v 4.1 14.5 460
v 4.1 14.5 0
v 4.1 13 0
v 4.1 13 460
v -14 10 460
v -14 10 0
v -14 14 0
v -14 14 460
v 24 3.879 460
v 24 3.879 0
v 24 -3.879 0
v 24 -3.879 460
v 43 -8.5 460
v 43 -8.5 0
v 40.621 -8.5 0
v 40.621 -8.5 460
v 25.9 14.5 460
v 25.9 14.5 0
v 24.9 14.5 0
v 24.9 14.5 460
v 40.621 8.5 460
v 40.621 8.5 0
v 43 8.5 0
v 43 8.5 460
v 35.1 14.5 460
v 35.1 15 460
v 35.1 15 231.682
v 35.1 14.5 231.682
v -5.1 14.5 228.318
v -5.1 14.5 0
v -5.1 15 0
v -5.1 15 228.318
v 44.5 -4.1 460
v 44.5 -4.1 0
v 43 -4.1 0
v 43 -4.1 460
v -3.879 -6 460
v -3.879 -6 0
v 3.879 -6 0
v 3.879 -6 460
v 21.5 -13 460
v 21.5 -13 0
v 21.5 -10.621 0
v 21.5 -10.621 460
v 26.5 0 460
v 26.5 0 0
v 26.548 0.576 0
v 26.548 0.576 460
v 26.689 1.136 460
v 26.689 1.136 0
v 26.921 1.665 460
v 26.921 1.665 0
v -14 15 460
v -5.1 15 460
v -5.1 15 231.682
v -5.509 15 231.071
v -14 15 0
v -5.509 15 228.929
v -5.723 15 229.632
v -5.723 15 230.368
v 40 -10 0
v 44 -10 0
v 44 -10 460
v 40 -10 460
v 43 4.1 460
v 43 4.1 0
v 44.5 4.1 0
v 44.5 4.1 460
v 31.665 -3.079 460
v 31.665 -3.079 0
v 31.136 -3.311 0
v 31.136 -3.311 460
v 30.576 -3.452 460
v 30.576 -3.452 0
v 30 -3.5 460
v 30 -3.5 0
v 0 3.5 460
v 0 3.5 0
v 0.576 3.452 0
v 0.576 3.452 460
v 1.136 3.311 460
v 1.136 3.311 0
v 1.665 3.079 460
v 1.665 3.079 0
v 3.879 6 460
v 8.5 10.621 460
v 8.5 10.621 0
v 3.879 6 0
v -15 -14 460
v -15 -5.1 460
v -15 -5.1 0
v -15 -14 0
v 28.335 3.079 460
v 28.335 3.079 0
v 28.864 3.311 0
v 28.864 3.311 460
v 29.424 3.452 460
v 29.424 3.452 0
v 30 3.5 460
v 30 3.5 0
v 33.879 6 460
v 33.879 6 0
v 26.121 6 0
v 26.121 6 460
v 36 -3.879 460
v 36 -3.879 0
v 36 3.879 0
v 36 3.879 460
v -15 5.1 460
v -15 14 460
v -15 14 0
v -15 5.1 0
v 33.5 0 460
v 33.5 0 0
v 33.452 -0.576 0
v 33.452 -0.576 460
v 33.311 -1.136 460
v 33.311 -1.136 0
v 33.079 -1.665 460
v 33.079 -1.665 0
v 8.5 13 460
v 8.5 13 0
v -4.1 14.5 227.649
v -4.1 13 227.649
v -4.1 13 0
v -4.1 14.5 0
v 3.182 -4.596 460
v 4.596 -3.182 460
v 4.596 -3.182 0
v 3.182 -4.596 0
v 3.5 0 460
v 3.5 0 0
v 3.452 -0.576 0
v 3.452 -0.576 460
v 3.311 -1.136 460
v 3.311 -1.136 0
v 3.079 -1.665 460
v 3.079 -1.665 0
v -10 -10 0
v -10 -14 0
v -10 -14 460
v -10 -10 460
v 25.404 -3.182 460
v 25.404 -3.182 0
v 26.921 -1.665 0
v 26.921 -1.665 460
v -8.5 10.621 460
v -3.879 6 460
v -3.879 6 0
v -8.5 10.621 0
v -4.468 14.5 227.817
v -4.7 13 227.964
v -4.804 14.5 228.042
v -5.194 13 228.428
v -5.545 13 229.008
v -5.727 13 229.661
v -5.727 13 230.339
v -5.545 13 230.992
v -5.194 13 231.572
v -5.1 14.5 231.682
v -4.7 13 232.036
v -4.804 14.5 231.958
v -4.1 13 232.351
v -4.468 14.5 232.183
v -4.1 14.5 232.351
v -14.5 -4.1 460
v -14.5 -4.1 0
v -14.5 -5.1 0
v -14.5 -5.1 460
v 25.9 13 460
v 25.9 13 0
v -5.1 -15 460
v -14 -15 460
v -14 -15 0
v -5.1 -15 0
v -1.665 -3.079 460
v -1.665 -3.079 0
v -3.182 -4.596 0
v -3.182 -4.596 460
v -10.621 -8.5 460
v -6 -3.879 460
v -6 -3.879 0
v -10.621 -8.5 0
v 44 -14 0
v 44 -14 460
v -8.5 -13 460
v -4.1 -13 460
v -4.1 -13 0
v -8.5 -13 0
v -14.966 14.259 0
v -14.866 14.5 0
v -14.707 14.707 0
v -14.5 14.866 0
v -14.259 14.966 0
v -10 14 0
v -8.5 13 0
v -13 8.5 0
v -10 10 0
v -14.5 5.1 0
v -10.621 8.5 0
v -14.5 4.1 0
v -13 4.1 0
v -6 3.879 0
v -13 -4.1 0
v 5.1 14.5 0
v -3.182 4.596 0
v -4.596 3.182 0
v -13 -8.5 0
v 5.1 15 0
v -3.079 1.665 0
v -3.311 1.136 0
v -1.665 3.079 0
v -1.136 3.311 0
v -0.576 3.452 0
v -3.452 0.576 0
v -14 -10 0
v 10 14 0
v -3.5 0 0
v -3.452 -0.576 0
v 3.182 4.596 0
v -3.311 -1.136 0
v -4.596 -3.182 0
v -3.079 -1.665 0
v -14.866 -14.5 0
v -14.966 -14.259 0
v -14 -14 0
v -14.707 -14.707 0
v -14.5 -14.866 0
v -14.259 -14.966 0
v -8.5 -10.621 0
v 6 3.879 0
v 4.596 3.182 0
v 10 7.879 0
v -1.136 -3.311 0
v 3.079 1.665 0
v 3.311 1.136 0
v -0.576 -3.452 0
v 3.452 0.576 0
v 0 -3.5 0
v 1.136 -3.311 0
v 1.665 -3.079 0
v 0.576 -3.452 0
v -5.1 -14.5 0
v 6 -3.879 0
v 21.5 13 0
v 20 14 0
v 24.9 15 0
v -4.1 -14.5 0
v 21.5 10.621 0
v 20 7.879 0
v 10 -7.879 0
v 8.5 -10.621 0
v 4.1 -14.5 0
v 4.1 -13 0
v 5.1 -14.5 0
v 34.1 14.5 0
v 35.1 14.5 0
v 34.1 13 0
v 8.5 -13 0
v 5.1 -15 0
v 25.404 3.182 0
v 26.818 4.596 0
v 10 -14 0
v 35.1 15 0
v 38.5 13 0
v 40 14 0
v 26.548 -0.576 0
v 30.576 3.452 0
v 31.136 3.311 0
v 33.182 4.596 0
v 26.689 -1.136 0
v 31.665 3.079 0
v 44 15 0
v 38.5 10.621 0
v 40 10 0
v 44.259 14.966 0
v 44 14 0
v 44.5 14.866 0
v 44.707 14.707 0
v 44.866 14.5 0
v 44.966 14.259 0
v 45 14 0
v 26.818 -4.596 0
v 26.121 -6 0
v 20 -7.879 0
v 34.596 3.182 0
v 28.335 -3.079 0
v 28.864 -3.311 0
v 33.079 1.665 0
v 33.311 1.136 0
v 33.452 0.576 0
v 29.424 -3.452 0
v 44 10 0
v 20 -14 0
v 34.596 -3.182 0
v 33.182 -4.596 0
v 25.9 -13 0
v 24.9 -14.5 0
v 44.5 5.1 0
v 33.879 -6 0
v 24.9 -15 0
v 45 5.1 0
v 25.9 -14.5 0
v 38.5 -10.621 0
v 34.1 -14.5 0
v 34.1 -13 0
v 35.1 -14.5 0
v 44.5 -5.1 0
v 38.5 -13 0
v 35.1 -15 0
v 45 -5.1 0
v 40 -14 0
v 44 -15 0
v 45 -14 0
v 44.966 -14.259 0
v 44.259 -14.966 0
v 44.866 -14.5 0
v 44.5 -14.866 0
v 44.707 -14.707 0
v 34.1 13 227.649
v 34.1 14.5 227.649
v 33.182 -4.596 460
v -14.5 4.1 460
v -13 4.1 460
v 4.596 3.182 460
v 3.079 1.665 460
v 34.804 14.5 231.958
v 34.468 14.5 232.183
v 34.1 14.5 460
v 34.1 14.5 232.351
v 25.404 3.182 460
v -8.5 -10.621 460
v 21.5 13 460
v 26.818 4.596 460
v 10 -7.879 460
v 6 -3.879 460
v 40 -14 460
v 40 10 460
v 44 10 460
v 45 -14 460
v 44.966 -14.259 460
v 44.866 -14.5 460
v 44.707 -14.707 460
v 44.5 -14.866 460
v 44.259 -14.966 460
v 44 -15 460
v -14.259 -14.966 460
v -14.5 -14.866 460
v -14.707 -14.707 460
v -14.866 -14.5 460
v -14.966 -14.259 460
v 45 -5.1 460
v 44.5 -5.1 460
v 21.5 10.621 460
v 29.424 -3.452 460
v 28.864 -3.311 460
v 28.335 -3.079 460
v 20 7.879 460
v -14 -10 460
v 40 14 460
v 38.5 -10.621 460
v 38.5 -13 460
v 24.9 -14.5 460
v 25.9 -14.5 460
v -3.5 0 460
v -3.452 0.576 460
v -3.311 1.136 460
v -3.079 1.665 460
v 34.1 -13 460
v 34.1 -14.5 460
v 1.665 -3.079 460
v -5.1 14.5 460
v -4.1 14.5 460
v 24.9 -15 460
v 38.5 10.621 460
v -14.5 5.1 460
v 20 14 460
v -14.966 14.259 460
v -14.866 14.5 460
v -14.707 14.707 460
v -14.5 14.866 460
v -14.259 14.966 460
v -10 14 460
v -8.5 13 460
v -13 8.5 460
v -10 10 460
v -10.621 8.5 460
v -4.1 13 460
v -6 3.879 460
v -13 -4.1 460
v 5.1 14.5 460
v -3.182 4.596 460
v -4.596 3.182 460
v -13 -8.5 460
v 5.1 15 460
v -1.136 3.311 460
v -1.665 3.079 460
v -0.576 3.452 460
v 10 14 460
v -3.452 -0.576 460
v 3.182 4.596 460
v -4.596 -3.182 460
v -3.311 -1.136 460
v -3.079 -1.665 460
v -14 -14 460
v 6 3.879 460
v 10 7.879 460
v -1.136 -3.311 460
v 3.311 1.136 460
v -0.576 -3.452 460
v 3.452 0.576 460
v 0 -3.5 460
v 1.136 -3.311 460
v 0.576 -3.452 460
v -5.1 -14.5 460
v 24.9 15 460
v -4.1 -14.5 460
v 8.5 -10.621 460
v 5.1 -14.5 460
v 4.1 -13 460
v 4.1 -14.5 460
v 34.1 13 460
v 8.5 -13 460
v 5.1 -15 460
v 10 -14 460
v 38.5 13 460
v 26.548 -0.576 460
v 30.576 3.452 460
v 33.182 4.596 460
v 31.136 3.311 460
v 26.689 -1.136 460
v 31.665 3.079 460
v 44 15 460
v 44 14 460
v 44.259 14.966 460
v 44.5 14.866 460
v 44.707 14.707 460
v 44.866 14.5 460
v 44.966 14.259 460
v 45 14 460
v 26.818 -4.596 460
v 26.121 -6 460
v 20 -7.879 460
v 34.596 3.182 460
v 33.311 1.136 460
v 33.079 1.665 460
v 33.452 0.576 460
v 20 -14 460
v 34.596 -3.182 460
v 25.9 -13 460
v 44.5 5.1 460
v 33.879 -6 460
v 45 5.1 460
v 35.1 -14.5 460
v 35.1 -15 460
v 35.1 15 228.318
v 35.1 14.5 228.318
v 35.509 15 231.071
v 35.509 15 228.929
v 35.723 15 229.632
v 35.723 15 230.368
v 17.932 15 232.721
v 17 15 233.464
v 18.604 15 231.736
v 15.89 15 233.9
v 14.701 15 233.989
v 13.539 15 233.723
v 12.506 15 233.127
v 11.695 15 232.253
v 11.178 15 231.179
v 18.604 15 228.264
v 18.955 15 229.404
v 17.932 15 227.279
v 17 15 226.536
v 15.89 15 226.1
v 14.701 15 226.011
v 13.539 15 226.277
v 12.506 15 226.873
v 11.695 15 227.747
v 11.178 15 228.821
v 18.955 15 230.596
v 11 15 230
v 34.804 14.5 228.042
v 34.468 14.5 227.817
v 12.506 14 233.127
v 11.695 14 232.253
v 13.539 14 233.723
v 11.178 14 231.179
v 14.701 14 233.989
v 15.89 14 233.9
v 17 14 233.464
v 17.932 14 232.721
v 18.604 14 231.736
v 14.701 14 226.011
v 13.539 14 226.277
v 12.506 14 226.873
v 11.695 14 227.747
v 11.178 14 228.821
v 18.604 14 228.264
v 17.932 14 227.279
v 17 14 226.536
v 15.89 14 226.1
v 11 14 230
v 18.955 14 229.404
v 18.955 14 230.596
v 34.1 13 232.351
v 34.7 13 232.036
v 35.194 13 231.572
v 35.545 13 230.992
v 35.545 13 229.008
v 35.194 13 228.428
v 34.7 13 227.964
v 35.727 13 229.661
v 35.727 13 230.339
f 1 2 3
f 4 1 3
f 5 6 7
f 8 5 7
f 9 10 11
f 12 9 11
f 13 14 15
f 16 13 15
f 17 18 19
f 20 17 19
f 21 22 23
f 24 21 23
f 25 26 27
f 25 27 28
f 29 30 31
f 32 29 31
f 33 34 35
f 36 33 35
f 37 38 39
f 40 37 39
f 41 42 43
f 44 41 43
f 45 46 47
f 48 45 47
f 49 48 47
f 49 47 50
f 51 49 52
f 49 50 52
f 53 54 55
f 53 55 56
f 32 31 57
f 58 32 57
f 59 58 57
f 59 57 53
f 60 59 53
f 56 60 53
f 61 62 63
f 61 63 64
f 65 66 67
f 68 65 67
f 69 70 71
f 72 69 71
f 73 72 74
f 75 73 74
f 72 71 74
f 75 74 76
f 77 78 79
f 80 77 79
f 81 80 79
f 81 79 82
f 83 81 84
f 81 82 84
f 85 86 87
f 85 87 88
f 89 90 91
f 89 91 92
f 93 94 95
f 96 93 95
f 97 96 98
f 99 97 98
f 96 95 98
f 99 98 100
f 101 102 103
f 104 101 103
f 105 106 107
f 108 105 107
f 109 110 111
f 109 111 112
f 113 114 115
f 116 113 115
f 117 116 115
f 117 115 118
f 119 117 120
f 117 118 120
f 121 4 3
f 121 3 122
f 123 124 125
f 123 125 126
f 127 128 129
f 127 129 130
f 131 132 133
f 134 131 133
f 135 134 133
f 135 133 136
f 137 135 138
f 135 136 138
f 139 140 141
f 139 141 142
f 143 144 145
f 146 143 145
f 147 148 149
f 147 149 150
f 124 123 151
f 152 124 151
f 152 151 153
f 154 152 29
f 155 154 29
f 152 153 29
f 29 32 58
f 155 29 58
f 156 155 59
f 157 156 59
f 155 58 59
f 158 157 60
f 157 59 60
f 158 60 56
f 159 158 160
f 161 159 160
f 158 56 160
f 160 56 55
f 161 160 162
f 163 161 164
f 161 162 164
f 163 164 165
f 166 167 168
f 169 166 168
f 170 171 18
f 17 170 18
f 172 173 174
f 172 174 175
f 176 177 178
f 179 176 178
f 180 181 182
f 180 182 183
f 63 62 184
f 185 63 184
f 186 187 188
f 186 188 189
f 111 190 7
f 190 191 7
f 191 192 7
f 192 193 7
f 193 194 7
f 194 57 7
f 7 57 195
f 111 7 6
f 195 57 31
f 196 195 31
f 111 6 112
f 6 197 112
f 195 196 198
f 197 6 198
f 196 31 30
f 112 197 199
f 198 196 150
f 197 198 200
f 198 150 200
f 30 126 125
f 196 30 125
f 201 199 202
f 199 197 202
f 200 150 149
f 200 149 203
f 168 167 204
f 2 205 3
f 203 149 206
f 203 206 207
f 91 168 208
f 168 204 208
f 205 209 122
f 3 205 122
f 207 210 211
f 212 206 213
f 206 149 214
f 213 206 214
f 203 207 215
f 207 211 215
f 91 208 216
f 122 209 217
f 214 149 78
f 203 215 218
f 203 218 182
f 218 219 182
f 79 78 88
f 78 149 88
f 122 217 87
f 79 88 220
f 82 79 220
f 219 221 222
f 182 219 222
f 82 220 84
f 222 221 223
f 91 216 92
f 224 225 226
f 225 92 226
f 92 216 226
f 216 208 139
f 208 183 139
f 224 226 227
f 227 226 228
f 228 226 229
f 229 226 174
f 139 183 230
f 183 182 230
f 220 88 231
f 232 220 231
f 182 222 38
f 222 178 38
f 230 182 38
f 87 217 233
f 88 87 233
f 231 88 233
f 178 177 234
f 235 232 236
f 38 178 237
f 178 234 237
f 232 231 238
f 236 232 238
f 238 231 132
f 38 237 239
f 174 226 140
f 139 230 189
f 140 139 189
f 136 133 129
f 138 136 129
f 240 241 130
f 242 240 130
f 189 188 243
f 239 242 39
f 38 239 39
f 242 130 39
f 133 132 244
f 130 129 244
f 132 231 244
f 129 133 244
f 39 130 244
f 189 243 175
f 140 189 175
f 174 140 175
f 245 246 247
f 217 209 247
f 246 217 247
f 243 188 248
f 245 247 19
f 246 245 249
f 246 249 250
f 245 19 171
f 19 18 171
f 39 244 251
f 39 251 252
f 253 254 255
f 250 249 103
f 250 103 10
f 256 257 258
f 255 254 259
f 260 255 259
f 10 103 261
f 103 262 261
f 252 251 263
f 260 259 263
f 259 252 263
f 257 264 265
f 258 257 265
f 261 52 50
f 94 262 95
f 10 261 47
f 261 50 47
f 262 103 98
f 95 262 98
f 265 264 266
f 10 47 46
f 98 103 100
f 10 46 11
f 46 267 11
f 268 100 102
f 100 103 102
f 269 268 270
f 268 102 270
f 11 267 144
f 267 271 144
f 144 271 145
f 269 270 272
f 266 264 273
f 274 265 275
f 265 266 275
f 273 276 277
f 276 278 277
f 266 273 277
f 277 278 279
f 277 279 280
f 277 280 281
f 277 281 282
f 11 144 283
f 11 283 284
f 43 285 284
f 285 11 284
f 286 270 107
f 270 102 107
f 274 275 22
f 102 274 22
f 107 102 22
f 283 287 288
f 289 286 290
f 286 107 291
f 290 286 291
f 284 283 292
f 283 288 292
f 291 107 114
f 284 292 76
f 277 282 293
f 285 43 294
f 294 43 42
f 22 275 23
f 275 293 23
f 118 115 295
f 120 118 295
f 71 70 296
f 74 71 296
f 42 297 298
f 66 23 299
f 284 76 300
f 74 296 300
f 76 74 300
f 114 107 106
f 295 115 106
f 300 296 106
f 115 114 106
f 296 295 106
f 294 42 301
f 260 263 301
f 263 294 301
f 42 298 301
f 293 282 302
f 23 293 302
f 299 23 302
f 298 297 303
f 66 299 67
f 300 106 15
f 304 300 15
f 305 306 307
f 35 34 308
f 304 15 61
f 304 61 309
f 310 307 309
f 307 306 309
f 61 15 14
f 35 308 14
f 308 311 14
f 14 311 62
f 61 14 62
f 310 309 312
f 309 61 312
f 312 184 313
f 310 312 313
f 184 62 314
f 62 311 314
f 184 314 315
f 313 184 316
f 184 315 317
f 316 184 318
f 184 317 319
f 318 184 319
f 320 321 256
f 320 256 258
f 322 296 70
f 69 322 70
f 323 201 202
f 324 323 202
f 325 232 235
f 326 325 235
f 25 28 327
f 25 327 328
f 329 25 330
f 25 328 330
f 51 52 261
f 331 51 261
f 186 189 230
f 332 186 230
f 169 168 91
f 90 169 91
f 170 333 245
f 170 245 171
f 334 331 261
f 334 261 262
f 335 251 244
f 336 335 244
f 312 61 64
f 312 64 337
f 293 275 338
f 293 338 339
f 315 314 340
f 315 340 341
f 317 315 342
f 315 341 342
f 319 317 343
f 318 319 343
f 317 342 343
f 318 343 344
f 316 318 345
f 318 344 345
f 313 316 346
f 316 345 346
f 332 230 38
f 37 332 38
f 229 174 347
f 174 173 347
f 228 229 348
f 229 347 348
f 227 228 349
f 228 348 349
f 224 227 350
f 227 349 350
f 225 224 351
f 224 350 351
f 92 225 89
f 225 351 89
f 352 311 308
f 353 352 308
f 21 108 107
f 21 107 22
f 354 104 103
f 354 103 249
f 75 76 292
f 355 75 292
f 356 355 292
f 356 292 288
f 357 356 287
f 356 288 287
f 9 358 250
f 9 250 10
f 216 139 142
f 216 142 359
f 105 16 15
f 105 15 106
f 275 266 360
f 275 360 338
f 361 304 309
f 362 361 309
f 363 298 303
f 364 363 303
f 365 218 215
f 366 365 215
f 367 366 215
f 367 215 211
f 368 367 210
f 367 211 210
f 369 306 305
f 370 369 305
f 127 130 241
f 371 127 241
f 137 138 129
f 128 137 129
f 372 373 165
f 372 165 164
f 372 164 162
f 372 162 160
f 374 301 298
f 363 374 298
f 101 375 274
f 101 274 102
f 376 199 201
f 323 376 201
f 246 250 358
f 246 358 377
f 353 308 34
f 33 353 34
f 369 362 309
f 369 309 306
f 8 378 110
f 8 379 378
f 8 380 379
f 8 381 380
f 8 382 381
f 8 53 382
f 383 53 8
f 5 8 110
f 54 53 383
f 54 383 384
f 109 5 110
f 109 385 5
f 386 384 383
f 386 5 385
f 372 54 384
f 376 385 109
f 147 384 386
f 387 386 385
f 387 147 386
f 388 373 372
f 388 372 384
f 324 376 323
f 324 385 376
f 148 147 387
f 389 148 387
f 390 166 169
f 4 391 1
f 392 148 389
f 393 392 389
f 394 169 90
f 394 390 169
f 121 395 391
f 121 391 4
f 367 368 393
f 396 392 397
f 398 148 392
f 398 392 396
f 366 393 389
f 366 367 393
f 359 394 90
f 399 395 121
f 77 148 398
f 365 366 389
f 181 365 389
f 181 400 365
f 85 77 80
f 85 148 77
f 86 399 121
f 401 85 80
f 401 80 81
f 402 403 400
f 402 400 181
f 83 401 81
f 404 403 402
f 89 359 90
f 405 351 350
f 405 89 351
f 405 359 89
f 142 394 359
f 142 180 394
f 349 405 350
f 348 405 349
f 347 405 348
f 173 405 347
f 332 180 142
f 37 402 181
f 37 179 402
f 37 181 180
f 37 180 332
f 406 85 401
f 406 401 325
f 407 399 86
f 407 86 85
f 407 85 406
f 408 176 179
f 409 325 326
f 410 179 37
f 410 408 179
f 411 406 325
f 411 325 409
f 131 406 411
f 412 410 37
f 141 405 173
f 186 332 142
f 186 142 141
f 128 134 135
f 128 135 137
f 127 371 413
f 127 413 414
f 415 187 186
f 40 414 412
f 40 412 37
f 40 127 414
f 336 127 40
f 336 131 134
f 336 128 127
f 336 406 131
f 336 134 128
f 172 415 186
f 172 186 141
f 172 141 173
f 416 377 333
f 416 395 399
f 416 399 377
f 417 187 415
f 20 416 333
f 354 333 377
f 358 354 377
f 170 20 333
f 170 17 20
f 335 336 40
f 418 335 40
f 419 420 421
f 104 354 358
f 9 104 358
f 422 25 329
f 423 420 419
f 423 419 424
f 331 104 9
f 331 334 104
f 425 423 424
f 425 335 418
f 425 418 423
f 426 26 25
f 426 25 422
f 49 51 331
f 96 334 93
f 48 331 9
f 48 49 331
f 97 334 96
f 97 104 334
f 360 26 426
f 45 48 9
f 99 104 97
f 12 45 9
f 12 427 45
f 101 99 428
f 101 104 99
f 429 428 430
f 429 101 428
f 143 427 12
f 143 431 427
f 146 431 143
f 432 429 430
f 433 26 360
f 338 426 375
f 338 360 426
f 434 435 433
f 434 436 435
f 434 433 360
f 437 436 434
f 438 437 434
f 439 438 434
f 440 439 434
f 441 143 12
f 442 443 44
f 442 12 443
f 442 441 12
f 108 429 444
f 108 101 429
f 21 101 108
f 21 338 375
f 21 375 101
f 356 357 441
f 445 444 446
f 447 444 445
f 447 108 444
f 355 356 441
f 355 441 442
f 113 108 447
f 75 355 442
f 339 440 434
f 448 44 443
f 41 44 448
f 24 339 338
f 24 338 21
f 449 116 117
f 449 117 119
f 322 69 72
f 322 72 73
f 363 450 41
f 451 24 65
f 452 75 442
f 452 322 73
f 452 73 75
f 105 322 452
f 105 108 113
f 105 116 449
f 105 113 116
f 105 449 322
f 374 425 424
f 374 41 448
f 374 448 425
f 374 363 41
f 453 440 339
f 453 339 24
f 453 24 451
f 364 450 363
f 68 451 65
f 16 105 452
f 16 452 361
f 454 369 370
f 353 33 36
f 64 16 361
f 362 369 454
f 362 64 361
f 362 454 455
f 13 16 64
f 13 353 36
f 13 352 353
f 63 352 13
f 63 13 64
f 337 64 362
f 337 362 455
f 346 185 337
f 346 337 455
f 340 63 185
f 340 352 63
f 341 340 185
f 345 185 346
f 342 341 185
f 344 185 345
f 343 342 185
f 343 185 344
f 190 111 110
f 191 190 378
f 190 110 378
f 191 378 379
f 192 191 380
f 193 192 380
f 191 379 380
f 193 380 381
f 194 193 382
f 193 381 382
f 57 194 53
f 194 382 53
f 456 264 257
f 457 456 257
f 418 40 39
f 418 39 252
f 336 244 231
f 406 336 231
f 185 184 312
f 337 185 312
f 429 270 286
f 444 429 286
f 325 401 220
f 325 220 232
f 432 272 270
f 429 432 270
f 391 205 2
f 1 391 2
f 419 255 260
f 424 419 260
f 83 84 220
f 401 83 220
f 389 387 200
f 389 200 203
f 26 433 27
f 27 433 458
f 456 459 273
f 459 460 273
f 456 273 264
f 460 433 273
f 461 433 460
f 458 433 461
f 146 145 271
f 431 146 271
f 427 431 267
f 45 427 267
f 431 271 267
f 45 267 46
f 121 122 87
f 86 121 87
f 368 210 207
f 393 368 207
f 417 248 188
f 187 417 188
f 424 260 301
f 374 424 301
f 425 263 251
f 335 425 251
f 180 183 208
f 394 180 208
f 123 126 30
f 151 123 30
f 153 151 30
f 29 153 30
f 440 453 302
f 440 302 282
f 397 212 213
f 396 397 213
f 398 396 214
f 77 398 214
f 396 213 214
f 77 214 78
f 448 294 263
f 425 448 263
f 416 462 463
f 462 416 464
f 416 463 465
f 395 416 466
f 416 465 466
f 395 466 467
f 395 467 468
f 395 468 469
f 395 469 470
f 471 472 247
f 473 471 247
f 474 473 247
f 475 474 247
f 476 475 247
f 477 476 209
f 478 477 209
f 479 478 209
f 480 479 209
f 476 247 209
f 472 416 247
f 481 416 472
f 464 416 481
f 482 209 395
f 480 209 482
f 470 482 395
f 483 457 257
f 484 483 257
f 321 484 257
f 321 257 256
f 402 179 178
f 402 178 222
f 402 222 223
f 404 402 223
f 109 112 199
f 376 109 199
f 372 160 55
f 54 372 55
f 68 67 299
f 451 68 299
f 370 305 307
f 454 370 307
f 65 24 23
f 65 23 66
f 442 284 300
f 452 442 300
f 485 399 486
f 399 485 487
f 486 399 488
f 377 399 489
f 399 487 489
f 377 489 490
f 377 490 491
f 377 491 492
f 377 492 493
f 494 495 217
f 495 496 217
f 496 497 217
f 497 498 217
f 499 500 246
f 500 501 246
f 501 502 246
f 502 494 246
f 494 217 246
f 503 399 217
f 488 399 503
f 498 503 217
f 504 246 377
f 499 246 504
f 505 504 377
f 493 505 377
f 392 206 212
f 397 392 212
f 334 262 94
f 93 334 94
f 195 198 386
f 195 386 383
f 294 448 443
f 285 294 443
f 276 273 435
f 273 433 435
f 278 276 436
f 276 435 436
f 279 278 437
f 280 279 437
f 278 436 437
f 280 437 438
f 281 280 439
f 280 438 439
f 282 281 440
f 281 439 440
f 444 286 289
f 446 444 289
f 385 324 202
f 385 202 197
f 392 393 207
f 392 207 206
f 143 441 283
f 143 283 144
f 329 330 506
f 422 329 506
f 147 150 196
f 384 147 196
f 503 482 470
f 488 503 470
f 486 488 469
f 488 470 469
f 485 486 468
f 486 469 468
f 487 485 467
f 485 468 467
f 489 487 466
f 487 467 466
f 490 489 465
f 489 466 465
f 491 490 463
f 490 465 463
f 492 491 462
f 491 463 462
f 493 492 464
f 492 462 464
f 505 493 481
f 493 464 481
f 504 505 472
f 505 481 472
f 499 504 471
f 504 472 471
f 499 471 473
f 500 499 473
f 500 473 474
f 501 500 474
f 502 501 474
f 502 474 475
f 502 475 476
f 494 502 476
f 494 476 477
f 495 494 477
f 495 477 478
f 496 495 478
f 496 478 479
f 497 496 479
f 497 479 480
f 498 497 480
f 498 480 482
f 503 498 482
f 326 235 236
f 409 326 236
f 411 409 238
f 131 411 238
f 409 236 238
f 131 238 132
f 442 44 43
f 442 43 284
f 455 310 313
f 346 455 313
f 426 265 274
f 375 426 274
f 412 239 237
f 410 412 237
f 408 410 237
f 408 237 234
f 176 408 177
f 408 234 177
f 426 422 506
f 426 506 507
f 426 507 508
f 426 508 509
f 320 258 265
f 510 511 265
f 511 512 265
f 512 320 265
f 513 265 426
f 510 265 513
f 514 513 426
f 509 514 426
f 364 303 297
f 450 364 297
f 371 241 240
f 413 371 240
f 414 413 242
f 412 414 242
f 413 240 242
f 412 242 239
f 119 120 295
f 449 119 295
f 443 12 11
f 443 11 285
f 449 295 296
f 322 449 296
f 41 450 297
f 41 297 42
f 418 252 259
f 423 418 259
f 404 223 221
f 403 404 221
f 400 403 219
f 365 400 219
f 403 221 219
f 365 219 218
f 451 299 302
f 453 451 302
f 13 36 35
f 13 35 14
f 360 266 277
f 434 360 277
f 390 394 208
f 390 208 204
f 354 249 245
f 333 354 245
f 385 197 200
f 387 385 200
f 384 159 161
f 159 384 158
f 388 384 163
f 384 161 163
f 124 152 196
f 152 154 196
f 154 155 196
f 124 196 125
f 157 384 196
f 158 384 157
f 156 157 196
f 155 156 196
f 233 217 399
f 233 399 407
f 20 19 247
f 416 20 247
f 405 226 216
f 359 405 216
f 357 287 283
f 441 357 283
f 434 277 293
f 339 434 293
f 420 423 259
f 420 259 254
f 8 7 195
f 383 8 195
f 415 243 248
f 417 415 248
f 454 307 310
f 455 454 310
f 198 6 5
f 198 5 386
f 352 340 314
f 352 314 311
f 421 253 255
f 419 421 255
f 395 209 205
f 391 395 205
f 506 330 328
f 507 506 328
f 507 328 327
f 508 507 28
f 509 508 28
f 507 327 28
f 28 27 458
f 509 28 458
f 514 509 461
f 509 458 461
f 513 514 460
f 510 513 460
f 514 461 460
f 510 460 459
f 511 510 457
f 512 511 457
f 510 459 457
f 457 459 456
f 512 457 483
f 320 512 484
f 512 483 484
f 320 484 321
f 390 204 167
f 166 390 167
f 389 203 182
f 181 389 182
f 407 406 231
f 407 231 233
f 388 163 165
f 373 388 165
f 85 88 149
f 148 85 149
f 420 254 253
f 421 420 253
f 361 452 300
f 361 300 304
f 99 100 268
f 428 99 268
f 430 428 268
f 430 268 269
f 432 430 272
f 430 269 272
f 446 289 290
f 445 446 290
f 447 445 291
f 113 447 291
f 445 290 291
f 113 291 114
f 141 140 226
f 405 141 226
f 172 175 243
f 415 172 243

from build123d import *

# Parameters (mm, degrees)
ESBO_O1_W                      = 4
ESBO_O1_H                      = 4
RESSALTO_EXTRUS_O1_DEPTH       = 460
PADR_OCIRCULAR1_COUNT          = 4
PADR_O_LINEAR1_COUNT           = 2
PADR_O_LINEAR1_PITCH           = 30
PADR_O_LINEAR1_COPY_1_SKETCH_W = 4
PADR_O_LINEAR1_COPY_1_SKETCH_H = 4
PADR_O_LINEAR1_COPY_1_DEPTH    = 460
PADR_O_LINEAR1_COPY_2_SKETCH_W = 4
PADR_O_LINEAR1_COPY_2_SKETCH_H = 4
PADR_O_LINEAR1_COPY_2_DEPTH    = 460
PADR_O_LINEAR1_COPY_3_SKETCH_W = 4
PADR_O_LINEAR1_COPY_3_SKETCH_H = 4
PADR_O_LINEAR1_COPY_3_DEPTH    = 460
ESBO_O4_W                      = 10
ESBO_O4_H                      = 28
CORTE_EXTRUS_O1_DEPTH          = 463.439185191
FILETE1_R                      = 1
ESBO_O5_R                      = 4
CORTE_EXTRUS_O2_DEPTH          = 10
SKETCH2_R                      = 2.5
CUT_EXTRUDE1_DEPTH             = 3


with BuildPart() as part:
    # Esboço1 → Ressalto-extrusão1 (new body)
    with BuildSketch(Plane.XY):
        with BuildLine():
            ThreePointArc((-1.664601464, 3.078815026), (-0.858529967, 3.393070335), (0, 3.5))
            Line((0, 3.5), (0, 6))
            Line((0, 6), (-3.878679656, 6))
            Line((-3.878679656, 6), (-8.5, 10.621320344))
            Line((-8.5, 10.621320344), (-8.5, 13))
            Line((-8.5, 13), (-4.1, 13))
            Line((-4.1, 13), (-4.1, 14.5))
            Line((-4.1, 14.5), (-5.1, 14.5))
            Line((-5.1, 14.5), (-5.1, 15))
            Line((-5.1, 15), (-15, 15))
            Line((-15, 15), (-15, 5.1))
            Line((-15, 5.1), (-14.5, 5.1))
            Line((-14.5, 5.1), (-14.5, 4.1))
            Line((-14.5, 4.1), (-13, 4.1))
            Line((-13, 4.1), (-13, 8.5))
            Line((-13, 8.5), (-10.621320344, 8.5))
            Line((-10.621320344, 8.5), (-6, 3.878679656))
            Line((-6, 3.878679656), (-6, 0))
            Line((-6, 0), (-3.5, 0))
            ThreePointArc((-3.5, 0), (-3.393070335, 0.858529967), (-3.078815026, 1.664601464))
            Line((-3.078815026, 1.664601464), (-4.596194078, 3.181980515))
            Line((-4.596194078, 3.181980515), (-3.181980515, 4.596194078))
            Line((-3.181980515, 4.596194078), (-1.664601464, 3.078815026))
        make_face()
        with Locations((-12, 12)):
            Rectangle(ESBO_O1_W, ESBO_O1_H, mode=Mode.SUBTRACT)
    ressalto_extrus_o1 = extrude(amount=RESSALTO_EXTRUS_O1_DEPTH)

    # PadrãoCircular1: Ressalto-extrusão1 ×4 about axis
    padr_ocircular1_axis = Axis((0, 0, 0), (0, 0, 1))
    for i in range(1, PADR_OCIRCULAR1_COUNT):
        add(ressalto_extrus_o1.rotate(padr_ocircular1_axis, i * 360 / PADR_OCIRCULAR1_COUNT))

    # Padrão linear1: Ressalto-extrusão1 ×2
    with Locations(*[(i * PADR_O_LINEAR1_PITCH, 0, 0) for i in range(1, PADR_O_LINEAR1_COUNT)]):
        add(ressalto_extrus_o1)

    # Padrão linear1 copy 1 sketch → Padrão linear1 copy 1 (add)
    with BuildSketch(Plane(origin=(30, 0, 0), x_dir=(0, 1, 0), z_dir=(0, 0, 1))):
        with BuildLine():
            ThreePointArc((-1.664601464, 3.078815026), (-0.858529967, 3.393070335), (0, 3.5))
            Line((0, 3.5), (0, 6))
            Line((0, 6), (-3.878679656, 6))
            Line((-3.878679656, 6), (-8.5, 10.621320344))
            Line((-8.5, 10.621320344), (-8.5, 13))
            Line((-8.5, 13), (-4.1, 13))
            Line((-4.1, 13), (-4.1, 14.5))
            Line((-4.1, 14.5), (-5.1, 14.5))
            Line((-5.1, 14.5), (-5.1, 15))
            Line((-5.1, 15), (-15, 15))
            Line((-15, 15), (-15, 5.1))
            Line((-15, 5.1), (-14.5, 5.1))
            Line((-14.5, 5.1), (-14.5, 4.1))
            Line((-14.5, 4.1), (-13, 4.1))
            Line((-13, 4.1), (-13, 8.5))
            Line((-13, 8.5), (-10.621320344, 8.5))
            Line((-10.621320344, 8.5), (-6, 3.878679656))
            Line((-6, 3.878679656), (-6, 0))
            Line((-6, 0), (-3.5, 0))
            ThreePointArc((-3.5, 0), (-3.393070335, 0.858529967), (-3.078815026, 1.664601464))
            Line((-3.078815026, 1.664601464), (-4.596194078, 3.181980515))
            Line((-4.596194078, 3.181980515), (-3.181980515, 4.596194078))
            Line((-3.181980515, 4.596194078), (-1.664601464, 3.078815026))
        make_face()
        with Locations((-12, 12)):
            Rectangle(PADR_O_LINEAR1_COPY_1_SKETCH_W, PADR_O_LINEAR1_COPY_1_SKETCH_H, mode=Mode.SUBTRACT)
    extrude(amount=PADR_O_LINEAR1_COPY_1_DEPTH)

    # Padrão linear1 copy 2 sketch → Padrão linear1 copy 2 (add)
    with BuildSketch(Plane(origin=(30, 0, 0), x_dir=(-1, 0, 0), z_dir=(0, 0, 1))):
        with BuildLine():
            ThreePointArc((-1.664601464, 3.078815026), (-0.858529967, 3.393070335), (0, 3.5))
            Line((0, 3.5), (0, 6))
            Line((0, 6), (-3.878679656, 6))
            Line((-3.878679656, 6), (-8.5, 10.621320344))
            Line((-8.5, 10.621320344), (-8.5, 13))
            Line((-8.5, 13), (-4.1, 13))
            Line((-4.1, 13), (-4.1, 14.5))
            Line((-4.1, 14.5), (-5.1, 14.5))
            Line((-5.1, 14.5), (-5.1, 15))
            Line((-5.1, 15), (-15, 15))
            Line((-15, 15), (-15, 5.1))
            Line((-15, 5.1), (-14.5, 5.1))
            Line((-14.5, 5.1), (-14.5, 4.1))
            Line((-14.5, 4.1), (-13, 4.1))
            Line((-13, 4.1), (-13, 8.5))
            Line((-13, 8.5), (-10.621320344, 8.5))
            Line((-10.621320344, 8.5), (-6, 3.878679656))
            Line((-6, 3.878679656), (-6, 0))
            Line((-6, 0), (-3.5, 0))
            ThreePointArc((-3.5, 0), (-3.393070335, 0.858529967), (-3.078815026, 1.664601464))
            Line((-3.078815026, 1.664601464), (-4.596194078, 3.181980515))
            Line((-4.596194078, 3.181980515), (-3.181980515, 4.596194078))
            Line((-3.181980515, 4.596194078), (-1.664601464, 3.078815026))
        make_face()
        with Locations((-12, 12)):
            Rectangle(PADR_O_LINEAR1_COPY_2_SKETCH_W, PADR_O_LINEAR1_COPY_2_SKETCH_H, mode=Mode.SUBTRACT)
    extrude(amount=PADR_O_LINEAR1_COPY_2_DEPTH)

    # Padrão linear1 copy 3 sketch → Padrão linear1 copy 3 (add)
    with BuildSketch(Plane(origin=(30, 0, 0), x_dir=(0, -1, 0), z_dir=(0, 0, 1))):
        with BuildLine():
            ThreePointArc((-1.664601464, 3.078815026), (-0.858529967, 3.393070335), (0, 3.5))
            Line((0, 3.5), (0, 6))
            Line((0, 6), (-3.878679656, 6))
            Line((-3.878679656, 6), (-8.5, 10.621320344))
            Line((-8.5, 10.621320344), (-8.5, 13))
            Line((-8.5, 13), (-4.1, 13))
            Line((-4.1, 13), (-4.1, 14.5))
            Line((-4.1, 14.5), (-5.1, 14.5))
            Line((-5.1, 14.5), (-5.1, 15))
            Line((-5.1, 15), (-15, 15))
            Line((-15, 15), (-15, 5.1))
            Line((-15, 5.1), (-14.5, 5.1))
            Line((-14.5, 5.1), (-14.5, 4.1))
            Line((-14.5, 4.1), (-13, 4.1))
            Line((-13, 4.1), (-13, 8.5))
            Line((-13, 8.5), (-10.621320344, 8.5))
            Line((-10.621320344, 8.5), (-6, 3.878679656))
            Line((-6, 3.878679656), (-6, 0))
            Line((-6, 0), (-3.5, 0))
            ThreePointArc((-3.5, 0), (-3.393070335, 0.858529967), (-3.078815026, 1.664601464))
            Line((-3.078815026, 1.664601464), (-4.596194078, 3.181980515))
            Line((-4.596194078, 3.181980515), (-3.181980515, 4.596194078))
            Line((-3.181980515, 4.596194078), (-1.664601464, 3.078815026))
        make_face()
        with Locations((-12, 12)):
            Rectangle(PADR_O_LINEAR1_COPY_3_SKETCH_W, PADR_O_LINEAR1_COPY_3_SKETCH_H, mode=Mode.SUBTRACT)
    extrude(amount=PADR_O_LINEAR1_COPY_3_DEPTH)

    # Esboço4 → Corte-extrusão1 (cut, through all)
    with BuildSketch(Plane(origin=(0, 0, 0), x_dir=(-1, 0, 0), z_dir=(0, 0, -1))):
        with Locations((-15, 0)):
            Rectangle(ESBO_O4_W, ESBO_O4_H)
    extrude(amount=-CORTE_EXTRUS_O1_DEPTH, mode=Mode.SUBTRACT)

    # Filete1
    filete1_edges = [part.edges().sort_by_distance(p)[0] for p in [
        (45, -15, 230),
        (45, 15, 230),
        (-15, 15, 230),
        (-15, -15, 230),
    ]]
    fillet(filete1_edges, radius=FILETE1_R)

    # Esboço5 → Corte-extrusão2 (cut)
    with BuildSketch(Plane(origin=(0, 15, 0), x_dir=(1, 0, 0), z_dir=(0, 1, 0))):
        with Locations(Location((15, -230, 0), (0, 0, 180))):
            Circle(ESBO_O5_R)
    extrude(amount=-CORTE_EXTRUS_O2_DEPTH, mode=Mode.SUBTRACT)

    # Sketch2 → Cut-Extrude1 (cut)
    with BuildSketch(Plane(origin=(0, 15, 0), x_dir=(1, 0, 0), z_dir=(0, 1, 0))):
        with Locations((33.25, -230)):
            Circle(SKETCH2_R)
        with Locations((-3.25, -230)):
            Circle(SKETCH2_R)
    extrude(amount=-CUT_EXTRUDE1_DEPTH, mode=Mode.SUBTRACT)


solid = part.part
